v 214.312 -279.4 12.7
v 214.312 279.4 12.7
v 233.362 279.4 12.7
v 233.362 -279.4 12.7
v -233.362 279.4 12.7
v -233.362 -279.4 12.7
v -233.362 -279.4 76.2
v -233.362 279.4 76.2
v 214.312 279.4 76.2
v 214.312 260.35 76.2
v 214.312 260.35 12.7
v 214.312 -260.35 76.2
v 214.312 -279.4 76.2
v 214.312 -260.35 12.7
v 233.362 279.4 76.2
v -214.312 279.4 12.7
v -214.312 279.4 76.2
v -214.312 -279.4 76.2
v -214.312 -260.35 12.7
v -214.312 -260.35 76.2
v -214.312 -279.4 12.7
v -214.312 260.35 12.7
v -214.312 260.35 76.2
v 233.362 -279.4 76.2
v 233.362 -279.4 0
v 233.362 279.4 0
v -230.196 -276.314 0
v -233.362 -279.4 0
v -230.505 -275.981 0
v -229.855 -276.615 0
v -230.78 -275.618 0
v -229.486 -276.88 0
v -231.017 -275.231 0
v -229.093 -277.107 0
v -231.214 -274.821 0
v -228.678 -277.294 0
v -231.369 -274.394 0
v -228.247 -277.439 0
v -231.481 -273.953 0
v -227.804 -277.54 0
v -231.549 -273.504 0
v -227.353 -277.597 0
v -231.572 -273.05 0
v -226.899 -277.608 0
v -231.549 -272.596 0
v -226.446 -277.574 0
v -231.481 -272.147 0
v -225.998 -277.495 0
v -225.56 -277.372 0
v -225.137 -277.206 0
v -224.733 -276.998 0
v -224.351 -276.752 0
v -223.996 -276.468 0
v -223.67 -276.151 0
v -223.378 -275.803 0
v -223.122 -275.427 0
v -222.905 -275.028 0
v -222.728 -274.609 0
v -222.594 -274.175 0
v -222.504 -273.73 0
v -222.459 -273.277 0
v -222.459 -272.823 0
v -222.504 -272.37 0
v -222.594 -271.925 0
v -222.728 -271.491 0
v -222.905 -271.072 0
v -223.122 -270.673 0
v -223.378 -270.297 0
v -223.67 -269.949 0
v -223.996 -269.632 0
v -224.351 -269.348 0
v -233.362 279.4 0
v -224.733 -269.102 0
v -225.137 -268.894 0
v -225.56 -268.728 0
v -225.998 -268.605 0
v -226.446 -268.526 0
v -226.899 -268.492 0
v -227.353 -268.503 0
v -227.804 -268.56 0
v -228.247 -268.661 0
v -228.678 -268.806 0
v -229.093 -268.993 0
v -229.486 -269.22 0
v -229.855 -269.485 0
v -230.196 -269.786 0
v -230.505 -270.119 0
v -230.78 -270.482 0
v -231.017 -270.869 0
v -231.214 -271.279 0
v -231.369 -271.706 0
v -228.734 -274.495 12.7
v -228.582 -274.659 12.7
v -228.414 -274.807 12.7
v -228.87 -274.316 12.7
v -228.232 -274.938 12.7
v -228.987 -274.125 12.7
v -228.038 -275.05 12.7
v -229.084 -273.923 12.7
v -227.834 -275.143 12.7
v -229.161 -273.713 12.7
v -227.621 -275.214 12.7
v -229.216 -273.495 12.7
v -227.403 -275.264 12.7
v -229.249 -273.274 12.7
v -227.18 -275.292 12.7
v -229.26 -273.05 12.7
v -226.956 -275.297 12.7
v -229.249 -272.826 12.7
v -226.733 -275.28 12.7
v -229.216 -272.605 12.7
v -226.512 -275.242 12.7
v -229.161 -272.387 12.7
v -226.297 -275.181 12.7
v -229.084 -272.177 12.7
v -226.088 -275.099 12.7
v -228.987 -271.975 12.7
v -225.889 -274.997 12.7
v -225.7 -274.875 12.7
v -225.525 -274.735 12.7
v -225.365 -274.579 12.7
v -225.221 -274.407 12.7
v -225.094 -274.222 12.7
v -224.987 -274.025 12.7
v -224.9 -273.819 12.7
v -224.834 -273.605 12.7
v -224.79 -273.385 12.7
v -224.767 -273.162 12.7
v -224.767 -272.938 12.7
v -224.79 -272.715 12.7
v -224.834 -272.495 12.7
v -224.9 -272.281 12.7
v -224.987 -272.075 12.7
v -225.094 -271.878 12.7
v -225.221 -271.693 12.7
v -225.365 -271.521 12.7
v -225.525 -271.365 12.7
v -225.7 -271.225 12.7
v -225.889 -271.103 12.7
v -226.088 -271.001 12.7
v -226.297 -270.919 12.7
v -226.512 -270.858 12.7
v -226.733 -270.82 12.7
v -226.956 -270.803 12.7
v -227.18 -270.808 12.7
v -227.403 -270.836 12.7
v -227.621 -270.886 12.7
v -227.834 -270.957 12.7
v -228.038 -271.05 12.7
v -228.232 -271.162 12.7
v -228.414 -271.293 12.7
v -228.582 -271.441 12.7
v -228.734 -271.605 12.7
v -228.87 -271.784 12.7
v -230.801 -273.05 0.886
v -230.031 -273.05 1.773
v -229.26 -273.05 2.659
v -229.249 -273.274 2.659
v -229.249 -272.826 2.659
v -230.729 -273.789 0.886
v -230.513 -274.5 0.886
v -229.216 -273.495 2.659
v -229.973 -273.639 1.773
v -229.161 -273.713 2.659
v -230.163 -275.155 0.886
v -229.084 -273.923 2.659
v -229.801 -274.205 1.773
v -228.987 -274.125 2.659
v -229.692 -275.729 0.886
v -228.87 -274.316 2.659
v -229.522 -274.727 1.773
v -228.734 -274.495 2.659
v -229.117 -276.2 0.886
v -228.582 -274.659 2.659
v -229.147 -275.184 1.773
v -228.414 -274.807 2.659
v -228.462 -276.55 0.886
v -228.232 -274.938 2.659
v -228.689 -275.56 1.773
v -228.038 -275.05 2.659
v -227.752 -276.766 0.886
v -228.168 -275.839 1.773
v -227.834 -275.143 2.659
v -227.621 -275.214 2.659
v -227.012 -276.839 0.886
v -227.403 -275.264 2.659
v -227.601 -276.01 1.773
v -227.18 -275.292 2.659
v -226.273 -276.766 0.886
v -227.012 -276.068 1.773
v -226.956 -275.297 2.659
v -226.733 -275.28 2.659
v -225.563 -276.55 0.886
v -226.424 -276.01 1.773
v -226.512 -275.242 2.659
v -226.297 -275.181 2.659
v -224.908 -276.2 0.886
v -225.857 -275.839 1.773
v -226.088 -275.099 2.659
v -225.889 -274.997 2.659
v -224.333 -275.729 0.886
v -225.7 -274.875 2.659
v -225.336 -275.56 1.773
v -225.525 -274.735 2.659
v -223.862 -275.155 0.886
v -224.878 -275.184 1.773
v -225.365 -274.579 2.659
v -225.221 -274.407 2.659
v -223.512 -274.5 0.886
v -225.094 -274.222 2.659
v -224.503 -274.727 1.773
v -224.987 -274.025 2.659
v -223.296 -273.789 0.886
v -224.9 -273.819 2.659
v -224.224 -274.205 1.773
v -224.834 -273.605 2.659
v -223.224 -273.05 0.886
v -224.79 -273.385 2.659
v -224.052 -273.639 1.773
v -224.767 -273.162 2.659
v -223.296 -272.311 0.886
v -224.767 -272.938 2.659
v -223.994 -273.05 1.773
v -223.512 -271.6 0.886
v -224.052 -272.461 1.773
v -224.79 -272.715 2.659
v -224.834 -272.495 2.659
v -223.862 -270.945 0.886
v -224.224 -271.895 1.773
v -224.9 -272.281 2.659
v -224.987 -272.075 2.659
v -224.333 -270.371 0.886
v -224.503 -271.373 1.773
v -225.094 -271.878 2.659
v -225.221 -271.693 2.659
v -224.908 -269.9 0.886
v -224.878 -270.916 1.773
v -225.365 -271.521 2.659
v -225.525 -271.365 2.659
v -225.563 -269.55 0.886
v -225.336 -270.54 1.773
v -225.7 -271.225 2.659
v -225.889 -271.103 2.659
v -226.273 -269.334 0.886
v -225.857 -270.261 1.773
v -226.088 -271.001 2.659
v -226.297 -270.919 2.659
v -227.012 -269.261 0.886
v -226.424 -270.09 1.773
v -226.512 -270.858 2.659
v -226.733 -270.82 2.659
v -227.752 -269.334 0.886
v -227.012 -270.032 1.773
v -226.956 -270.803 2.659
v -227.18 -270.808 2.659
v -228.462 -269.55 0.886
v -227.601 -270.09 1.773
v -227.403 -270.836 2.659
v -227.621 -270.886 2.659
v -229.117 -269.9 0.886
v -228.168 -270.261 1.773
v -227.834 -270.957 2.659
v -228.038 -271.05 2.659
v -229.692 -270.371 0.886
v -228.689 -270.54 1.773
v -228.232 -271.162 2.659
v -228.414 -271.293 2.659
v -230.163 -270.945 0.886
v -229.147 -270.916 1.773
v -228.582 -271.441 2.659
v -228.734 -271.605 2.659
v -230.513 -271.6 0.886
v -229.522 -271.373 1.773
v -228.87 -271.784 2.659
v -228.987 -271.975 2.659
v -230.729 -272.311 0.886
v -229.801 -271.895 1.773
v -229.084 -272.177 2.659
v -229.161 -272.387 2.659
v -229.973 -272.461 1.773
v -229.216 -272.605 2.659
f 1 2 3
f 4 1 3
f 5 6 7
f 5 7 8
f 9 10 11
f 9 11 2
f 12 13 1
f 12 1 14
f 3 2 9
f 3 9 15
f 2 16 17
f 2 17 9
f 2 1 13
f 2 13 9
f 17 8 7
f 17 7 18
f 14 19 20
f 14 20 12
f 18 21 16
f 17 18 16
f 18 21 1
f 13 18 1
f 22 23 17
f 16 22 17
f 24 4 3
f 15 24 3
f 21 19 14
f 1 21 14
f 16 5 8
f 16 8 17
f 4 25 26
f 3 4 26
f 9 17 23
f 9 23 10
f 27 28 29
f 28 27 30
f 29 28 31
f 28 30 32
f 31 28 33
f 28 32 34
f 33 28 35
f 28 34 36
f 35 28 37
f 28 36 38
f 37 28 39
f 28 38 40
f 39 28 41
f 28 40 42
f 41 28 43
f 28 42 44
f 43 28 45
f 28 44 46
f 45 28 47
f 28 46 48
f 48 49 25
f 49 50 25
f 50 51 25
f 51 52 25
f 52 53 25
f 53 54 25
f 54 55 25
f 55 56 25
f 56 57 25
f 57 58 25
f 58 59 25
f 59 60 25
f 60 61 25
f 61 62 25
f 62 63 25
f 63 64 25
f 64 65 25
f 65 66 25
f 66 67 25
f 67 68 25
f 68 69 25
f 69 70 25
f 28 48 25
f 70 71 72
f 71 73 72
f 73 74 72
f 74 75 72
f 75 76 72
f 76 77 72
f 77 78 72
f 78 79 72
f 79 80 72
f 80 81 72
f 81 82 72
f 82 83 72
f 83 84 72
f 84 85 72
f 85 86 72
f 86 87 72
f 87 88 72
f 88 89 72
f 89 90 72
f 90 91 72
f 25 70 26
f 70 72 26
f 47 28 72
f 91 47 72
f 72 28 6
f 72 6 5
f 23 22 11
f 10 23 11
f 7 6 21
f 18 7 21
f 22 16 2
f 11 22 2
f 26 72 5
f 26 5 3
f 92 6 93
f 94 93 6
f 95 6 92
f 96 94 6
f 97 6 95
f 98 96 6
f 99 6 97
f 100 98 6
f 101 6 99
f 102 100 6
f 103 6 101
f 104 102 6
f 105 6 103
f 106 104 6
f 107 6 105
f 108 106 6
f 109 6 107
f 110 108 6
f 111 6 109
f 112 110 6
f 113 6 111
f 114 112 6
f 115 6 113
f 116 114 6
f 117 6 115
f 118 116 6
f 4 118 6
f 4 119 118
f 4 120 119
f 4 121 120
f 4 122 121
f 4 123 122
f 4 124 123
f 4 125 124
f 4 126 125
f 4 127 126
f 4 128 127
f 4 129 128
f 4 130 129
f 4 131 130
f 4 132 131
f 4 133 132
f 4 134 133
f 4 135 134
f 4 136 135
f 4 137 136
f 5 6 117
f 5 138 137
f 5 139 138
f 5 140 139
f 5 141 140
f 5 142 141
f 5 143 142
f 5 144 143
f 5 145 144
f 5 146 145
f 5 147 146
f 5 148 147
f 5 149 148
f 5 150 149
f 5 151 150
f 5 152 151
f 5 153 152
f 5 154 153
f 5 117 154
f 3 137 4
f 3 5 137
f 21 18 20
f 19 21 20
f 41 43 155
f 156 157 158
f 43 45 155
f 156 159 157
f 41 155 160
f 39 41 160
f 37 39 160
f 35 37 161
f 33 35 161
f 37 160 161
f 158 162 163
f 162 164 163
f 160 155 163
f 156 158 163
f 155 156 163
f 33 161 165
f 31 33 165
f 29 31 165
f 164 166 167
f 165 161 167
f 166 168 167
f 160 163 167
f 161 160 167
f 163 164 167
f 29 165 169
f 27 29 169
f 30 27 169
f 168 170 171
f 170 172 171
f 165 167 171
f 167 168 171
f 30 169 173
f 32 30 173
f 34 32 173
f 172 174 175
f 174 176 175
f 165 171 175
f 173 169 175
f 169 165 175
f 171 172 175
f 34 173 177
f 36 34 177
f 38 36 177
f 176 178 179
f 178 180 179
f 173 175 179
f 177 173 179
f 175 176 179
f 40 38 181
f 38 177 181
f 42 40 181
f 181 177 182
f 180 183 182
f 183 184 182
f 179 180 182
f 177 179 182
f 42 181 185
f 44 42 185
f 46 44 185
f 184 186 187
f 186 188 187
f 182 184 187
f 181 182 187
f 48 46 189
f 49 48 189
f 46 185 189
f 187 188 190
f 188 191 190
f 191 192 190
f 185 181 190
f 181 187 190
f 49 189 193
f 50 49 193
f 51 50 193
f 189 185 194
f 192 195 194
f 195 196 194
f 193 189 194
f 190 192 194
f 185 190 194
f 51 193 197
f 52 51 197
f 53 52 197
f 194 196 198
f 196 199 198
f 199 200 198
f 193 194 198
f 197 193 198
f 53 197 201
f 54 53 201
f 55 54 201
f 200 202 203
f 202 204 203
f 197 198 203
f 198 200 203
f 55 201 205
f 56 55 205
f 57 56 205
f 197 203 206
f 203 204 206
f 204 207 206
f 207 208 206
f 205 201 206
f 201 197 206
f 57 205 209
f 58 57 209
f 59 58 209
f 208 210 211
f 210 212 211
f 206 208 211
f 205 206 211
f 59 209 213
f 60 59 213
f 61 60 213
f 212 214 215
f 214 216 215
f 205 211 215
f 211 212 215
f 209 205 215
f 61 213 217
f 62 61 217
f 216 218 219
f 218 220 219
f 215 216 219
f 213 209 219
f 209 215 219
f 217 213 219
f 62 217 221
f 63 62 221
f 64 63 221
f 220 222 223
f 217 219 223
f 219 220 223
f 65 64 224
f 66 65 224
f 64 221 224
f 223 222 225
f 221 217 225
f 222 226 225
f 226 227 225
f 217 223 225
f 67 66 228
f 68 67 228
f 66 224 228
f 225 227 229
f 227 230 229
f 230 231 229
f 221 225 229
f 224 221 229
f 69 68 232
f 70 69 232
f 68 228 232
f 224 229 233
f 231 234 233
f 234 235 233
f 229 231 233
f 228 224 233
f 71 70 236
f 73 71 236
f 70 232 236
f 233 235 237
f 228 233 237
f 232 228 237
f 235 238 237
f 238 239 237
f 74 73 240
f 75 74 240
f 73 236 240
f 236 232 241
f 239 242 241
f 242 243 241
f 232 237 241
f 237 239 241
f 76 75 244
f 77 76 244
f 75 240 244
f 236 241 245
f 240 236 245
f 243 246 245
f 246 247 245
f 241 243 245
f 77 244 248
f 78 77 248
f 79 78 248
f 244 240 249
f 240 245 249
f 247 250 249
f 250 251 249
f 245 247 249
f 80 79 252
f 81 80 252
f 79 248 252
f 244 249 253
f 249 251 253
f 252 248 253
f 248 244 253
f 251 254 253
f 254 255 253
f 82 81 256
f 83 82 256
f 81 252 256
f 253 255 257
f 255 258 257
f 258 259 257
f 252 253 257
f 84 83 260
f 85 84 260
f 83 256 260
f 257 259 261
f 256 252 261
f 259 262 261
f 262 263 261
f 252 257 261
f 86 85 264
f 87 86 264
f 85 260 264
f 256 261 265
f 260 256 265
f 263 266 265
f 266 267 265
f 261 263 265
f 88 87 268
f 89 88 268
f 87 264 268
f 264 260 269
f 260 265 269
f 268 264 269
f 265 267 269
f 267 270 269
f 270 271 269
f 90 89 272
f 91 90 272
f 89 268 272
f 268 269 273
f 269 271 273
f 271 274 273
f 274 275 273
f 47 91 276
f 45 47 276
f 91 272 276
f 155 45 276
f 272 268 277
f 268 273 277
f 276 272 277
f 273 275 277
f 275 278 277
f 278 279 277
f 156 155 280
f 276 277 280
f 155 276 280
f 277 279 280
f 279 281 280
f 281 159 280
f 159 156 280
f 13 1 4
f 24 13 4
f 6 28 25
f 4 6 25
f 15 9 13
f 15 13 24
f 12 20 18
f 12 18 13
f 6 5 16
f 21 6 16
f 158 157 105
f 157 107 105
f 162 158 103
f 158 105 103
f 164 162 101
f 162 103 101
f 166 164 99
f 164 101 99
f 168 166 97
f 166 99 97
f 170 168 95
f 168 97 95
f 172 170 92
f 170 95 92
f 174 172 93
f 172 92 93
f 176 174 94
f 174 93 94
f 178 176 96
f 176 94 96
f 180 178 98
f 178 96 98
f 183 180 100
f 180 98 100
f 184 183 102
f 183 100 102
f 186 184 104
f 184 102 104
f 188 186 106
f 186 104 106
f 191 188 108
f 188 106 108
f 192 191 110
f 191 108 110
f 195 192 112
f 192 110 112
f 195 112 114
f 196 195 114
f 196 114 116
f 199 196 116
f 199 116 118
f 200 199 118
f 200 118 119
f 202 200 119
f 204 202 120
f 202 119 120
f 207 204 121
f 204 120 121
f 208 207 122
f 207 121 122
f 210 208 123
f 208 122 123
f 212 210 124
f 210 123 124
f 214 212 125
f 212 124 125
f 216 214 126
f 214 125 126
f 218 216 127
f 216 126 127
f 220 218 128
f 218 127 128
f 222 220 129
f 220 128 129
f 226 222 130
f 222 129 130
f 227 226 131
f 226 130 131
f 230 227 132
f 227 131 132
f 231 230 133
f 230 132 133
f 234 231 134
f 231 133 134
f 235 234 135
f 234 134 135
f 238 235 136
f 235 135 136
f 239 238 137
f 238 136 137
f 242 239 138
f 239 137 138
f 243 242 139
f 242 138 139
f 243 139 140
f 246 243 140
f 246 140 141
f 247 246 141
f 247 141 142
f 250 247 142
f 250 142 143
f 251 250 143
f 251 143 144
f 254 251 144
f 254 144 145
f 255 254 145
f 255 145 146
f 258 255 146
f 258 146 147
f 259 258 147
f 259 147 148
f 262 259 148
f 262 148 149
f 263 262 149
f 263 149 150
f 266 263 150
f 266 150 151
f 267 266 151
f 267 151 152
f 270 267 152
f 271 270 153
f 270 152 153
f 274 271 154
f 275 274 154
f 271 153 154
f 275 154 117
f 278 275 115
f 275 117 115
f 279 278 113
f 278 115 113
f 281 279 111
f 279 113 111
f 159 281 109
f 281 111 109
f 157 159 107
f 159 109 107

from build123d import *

# Parameters (mm, degrees)
F0_W           = 466.725
F0_H           = 558.8
F1_DEPTH       = 12.7
F2_W           = 19.05
F2_H           = 558.8
F3_DEPTH       = 63.5
F4_W           = 428.625
F4_H           = 19.05
F5_DEPTH       = 63.5
F7_D           = 4.4958
F7_CSINK_D     = 9.1186
F7_CSINK_ANGLE = 82


with BuildPart() as f1:
    # F0 (on Top) → F1 (new body)
    with BuildSketch(Plane.XY):
        Rectangle(F0_W, F0_H)
    extrude(amount=F1_DEPTH)

    # F7 (through all)
    with Locations(Plane(origin=(0, 0, 0), x_dir=(1, 0, 0), z_dir=(0, 0, -1))):
        with Locations((-227.0125, 273.05)):
            CounterSinkHole(F7_D / 2, F7_CSINK_D / 2, counter_sink_angle=F7_CSINK_ANGLE)


with BuildPart() as f3:
    # F2 (on face) → F3 (new body)
    with BuildSketch(Plane.XY.offset(12.7)):
        with Locations((-223.8375, 0)):
            Rectangle(F2_W, F2_H)
    extrude(amount=F3_DEPTH)


with BuildPart() as f3b:
    # F2 (on face) → F3, piece 2 (new body)
    with BuildSketch(Plane.XY.offset(12.7)):
        with Locations((223.8375, 0)):
            Rectangle(F2_W, F2_H)
    extrude(amount=F3_DEPTH)


with BuildPart() as f5:
    # F4 (on face) → F5 (new body, through all)
    with BuildSketch(Plane.XY.offset(12.7)):
        with Locations((0, -269.875)):
            Rectangle(F4_W, F4_H)
    extrude(amount=F5_DEPTH)


with BuildPart() as f5b:
    # F4 (on face) → F5, piece 2 (new body, through all)
    with BuildSketch(Plane.XY.offset(12.7)):
        with Locations((0, 269.875)):
            Rectangle(F4_W, F4_H)
    extrude(amount=F5_DEPTH)


solid = Compound([f1.part, f3.part, f3b.part, f5.part, f5b.part])
